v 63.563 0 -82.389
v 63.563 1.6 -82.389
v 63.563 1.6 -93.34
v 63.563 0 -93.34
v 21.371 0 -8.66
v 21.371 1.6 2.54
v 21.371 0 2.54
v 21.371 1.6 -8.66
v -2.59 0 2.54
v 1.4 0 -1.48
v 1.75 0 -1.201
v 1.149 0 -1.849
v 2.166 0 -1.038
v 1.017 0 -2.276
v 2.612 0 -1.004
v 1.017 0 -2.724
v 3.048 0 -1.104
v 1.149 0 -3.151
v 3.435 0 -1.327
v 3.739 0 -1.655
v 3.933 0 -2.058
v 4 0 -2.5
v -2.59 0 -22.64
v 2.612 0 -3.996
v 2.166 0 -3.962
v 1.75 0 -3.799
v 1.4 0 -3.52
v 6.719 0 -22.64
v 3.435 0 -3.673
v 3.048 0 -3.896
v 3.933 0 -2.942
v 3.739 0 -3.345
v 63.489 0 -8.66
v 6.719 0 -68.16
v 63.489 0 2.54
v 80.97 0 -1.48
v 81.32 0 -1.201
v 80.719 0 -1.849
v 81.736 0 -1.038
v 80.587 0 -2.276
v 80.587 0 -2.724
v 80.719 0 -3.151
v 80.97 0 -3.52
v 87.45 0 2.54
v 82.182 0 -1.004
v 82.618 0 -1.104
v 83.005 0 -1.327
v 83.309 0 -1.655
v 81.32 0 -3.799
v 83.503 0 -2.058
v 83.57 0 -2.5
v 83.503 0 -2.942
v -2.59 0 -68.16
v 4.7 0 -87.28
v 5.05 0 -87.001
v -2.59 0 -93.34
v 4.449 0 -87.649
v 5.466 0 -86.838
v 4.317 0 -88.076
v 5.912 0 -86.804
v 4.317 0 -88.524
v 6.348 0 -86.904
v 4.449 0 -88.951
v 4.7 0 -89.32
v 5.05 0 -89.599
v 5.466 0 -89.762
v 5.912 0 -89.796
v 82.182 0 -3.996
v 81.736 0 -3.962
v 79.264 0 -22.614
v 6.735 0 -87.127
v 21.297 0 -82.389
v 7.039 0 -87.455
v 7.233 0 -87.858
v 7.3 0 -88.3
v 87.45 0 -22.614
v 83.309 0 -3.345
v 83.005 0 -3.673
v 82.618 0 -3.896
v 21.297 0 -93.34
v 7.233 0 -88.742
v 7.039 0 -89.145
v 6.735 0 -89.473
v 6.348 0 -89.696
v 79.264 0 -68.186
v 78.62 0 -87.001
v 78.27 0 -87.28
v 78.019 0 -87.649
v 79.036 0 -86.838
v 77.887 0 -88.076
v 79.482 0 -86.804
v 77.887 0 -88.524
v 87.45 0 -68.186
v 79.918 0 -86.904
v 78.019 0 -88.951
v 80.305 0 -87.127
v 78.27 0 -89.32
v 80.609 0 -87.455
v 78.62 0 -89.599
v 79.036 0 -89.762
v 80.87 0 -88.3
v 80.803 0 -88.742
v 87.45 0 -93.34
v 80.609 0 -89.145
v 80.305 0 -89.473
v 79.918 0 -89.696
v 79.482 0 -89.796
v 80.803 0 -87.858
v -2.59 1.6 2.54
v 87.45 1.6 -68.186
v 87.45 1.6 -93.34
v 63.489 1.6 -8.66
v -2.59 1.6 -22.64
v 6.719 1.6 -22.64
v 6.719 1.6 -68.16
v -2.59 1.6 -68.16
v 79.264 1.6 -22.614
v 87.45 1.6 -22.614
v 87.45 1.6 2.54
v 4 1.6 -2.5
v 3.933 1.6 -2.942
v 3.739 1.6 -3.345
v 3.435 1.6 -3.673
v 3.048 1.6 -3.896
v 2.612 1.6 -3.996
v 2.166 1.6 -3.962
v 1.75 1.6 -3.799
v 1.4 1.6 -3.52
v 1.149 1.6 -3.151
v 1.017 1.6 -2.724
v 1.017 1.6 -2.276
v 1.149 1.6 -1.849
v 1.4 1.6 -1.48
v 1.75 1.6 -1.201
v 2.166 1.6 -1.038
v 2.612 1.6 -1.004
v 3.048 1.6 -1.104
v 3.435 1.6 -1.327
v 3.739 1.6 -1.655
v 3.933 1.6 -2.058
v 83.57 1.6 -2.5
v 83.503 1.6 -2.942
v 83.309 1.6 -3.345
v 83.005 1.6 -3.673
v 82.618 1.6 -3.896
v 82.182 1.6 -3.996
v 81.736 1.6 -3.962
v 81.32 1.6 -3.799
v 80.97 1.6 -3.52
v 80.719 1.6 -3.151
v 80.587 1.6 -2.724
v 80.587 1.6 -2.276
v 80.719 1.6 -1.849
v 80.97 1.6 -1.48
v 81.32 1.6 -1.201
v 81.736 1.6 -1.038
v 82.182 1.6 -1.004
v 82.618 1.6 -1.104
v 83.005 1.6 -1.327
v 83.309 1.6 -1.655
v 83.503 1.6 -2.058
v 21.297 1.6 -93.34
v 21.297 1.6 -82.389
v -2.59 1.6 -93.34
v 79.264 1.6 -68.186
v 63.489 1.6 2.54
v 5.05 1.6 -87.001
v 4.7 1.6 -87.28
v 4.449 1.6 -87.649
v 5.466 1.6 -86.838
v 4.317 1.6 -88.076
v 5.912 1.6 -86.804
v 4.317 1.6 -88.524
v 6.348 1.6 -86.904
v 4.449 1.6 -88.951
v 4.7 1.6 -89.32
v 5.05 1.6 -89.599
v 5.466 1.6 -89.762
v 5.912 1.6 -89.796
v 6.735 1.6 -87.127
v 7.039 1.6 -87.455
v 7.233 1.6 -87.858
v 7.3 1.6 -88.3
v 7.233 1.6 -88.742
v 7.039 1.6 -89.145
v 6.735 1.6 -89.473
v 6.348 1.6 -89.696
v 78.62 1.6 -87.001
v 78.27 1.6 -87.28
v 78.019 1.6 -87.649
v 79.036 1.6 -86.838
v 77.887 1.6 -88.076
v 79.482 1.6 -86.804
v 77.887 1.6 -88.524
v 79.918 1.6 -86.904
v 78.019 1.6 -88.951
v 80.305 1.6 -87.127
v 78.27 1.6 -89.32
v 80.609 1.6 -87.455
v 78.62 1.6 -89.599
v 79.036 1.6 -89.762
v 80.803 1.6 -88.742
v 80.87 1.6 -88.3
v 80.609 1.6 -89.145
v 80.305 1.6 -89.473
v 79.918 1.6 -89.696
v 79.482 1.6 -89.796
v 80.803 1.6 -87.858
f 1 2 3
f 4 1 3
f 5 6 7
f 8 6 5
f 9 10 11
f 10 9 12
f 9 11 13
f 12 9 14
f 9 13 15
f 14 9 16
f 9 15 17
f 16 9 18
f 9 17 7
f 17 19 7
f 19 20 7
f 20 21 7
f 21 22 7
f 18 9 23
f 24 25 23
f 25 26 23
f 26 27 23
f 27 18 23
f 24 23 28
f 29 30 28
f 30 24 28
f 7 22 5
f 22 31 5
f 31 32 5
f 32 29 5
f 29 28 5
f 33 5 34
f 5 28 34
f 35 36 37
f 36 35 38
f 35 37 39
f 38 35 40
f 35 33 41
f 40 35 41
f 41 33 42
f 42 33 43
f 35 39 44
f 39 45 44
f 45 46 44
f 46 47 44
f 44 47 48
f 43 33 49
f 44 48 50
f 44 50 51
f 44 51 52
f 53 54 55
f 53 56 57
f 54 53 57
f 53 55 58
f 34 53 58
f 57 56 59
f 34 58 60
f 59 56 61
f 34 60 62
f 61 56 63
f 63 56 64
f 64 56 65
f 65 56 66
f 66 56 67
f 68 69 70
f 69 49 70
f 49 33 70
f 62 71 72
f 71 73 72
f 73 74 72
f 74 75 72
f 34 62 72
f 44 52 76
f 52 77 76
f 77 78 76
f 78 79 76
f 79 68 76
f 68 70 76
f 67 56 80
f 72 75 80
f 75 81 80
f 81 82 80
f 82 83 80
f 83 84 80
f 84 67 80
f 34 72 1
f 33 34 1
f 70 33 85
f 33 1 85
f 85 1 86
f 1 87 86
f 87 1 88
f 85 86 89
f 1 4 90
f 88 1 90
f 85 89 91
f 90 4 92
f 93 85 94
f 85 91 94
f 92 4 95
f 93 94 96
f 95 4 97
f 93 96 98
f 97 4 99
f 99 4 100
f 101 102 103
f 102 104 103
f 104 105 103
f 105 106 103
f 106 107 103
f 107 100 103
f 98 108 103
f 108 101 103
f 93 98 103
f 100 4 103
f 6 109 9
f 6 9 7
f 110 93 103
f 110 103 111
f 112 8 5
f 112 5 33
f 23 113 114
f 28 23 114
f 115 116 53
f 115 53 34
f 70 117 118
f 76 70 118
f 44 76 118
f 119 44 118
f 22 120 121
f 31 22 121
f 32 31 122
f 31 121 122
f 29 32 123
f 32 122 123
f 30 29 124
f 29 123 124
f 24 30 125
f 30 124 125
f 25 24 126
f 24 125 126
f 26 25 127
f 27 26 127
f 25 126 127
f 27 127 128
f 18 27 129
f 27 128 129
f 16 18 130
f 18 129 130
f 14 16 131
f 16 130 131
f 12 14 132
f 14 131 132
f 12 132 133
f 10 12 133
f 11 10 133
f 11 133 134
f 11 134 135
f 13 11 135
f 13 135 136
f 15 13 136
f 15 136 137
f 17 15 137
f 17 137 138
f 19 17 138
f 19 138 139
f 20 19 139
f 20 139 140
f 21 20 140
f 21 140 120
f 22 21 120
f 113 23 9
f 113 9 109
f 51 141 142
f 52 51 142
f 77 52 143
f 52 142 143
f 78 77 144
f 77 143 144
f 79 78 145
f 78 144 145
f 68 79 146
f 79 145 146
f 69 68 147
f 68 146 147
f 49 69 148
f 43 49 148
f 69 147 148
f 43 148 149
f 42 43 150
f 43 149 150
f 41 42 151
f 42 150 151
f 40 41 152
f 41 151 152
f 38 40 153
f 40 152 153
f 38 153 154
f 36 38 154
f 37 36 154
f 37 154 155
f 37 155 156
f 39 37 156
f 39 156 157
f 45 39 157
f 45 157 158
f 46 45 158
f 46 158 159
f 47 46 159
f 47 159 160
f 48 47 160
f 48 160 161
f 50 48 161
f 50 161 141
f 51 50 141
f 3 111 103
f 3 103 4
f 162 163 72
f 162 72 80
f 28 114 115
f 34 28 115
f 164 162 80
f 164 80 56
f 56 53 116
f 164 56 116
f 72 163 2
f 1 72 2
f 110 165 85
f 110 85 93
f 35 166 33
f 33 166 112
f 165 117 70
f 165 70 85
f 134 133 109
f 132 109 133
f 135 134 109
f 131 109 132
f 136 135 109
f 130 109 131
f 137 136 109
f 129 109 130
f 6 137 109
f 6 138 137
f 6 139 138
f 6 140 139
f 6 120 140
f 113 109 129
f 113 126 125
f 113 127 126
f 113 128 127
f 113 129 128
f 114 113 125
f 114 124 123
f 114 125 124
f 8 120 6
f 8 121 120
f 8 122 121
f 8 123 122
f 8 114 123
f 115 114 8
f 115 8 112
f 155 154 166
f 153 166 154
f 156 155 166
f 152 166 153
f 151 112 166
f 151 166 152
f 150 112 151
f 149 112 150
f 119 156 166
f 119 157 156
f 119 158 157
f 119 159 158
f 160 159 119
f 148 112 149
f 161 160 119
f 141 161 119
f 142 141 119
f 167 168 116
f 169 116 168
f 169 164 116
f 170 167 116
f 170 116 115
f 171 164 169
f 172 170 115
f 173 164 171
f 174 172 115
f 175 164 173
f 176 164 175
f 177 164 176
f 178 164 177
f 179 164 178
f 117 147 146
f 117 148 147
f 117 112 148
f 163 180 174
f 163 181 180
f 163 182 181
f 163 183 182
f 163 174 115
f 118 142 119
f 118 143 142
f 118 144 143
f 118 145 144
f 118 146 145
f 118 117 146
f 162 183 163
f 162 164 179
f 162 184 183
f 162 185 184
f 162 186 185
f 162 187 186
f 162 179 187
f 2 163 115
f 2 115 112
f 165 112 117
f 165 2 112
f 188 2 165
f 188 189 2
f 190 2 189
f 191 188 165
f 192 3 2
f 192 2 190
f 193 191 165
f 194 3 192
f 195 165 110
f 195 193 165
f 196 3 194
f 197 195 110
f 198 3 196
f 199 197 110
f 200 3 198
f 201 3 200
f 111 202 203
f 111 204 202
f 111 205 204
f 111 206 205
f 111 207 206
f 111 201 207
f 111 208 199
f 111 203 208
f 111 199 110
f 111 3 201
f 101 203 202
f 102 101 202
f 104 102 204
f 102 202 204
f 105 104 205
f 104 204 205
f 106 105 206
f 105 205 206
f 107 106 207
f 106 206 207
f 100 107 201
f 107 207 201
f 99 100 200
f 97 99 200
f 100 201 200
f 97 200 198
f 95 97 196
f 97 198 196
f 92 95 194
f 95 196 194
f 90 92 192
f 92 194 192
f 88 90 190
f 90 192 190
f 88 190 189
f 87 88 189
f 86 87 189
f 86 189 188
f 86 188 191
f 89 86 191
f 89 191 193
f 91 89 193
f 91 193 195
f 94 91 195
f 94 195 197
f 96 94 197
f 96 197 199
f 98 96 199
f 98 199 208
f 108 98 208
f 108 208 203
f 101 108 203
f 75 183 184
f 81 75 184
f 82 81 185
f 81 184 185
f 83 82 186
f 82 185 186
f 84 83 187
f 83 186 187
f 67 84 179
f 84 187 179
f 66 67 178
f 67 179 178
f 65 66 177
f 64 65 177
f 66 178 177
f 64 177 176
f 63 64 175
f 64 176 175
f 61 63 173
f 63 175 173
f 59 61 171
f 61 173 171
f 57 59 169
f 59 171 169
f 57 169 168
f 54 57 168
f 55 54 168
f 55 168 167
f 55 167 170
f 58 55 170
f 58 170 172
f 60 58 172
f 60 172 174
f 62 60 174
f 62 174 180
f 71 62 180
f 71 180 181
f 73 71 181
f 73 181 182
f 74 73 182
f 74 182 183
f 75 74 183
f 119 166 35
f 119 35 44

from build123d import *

# Parameters (mm, degrees)
SKETCH2_W           = 84.57
SKETCH2_H           = 90.8
BOSS_EXTRUDE1_DEPTH = 1.6
SKETCH3_R           = 1.5
CUT_EXTRUDE1_DEPTH  = 2.6
SKETCH4_W           = 90.8
SKETCH4_H           = 1.6
BOSS_EXTRUDE2_DEPTH = 2.88
SKETCH5_W           = 90.8
SKETCH5_H           = 1.6
BOSS_EXTRUDE3_DEPTH = 2.59
SKETCH6_W           = 90.04
SKETCH6_H           = 1.6
BOSS_EXTRUDE4_DEPTH = 2.54
SKETCH7_W           = 90.04
SKETCH7_H           = 1.6
BOSS_EXTRUDE5_DEPTH = 2.54
SKETCH8_W           = 16.372642976
SKETCH8_H           = 45.571517242
SKETCH8_W_2         = 42.266473234
SKETCH8_H_2         = 21.901065616
SKETCH8_W_3         = 18.617013656
SKETCH8_H_3         = 45.520108402
SKETCH8_W_4         = 42.118702304
SKETCH8_H_4         = 22.400138828
CUT_EXTRUDE2_DEPTH  = 2.6


with BuildPart() as part:
    # Sketch2 → Boss-Extrude1 (new body)
    with BuildSketch(Plane(origin=(0, 0, 0), x_dir=(1, 0, 0), z_dir=(0, 1, 0))):
        with Locations((42.285, 45.4)):
            Rectangle(SKETCH2_W, SKETCH2_H)
    extrude(amount=BOSS_EXTRUDE1_DEPTH)

    # Sketch3 → Cut-Extrude1 (cut, through all)
    with BuildSketch(Plane(origin=(0, 1.6, 0), x_dir=(1, 0, 0), z_dir=(0, 1, 0))):
        with Locations((2.5, 2.5)):
            Circle(SKETCH3_R)
        with Locations((82.07, 2.5)):
            Circle(SKETCH3_R)
        with Locations((5.8, 88.3)):
            Circle(SKETCH3_R)
        with Locations((79.37, 88.3)):
            Circle(SKETCH3_R)
    extrude(amount=-CUT_EXTRUDE1_DEPTH, mode=Mode.SUBTRACT)

    # Sketch4 → Boss-Extrude2 (add)
    with BuildSketch(Plane(origin=(84.57, 0, 0), x_dir=(0, 0, -1), z_dir=(1, 0, 0))):
        with Locations((45.4, 0.8)):
            Rectangle(SKETCH4_W, SKETCH4_H)
    extrude(amount=BOSS_EXTRUDE2_DEPTH)

    # Sketch5 → Boss-Extrude3 (add)
    with BuildSketch(Plane.ZY):
        with Locations((-45.4, 0.8)):
            Rectangle(SKETCH5_W, SKETCH5_H)
    extrude(amount=BOSS_EXTRUDE3_DEPTH)

    # Sketch6 → Boss-Extrude4 (add)
    with BuildSketch(Plane(origin=(0, 0, -90.8), x_dir=(-1, 0, 0), z_dir=(0, 0, -1))):
        with Locations((-42.43, 0.8)):
            Rectangle(SKETCH6_W, SKETCH6_H)
    extrude(amount=BOSS_EXTRUDE4_DEPTH)

    # Sketch7 → Boss-Extrude5 (add)
    with BuildSketch(Plane.XY):
        with Locations((42.43, 0.8)):
            Rectangle(SKETCH7_W, SKETCH7_H)
    extrude(amount=BOSS_EXTRUDE5_DEPTH)

    # Sketch8 → Cut-Extrude2 (cut, through all)
    with BuildSketch(Plane(origin=(0, 1.6, 0), x_dir=(1, 0, 0), z_dir=(0, 1, 0))):
        with Locations((87.45, 45.4)):
            Rectangle(SKETCH8_W, SKETCH8_H)
        with Locations((42.43, 93.34)):
            Rectangle(SKETCH8_W_2, SKETCH8_H_2)
        with Locations((-2.59, 45.4)):
            Rectangle(SKETCH8_W_3, SKETCH8_H_3)
        with Locations((42.43, -2.54)):
            Rectangle(SKETCH8_W_4, SKETCH8_H_4)
    extrude(amount=-CUT_EXTRUDE2_DEPTH, mode=Mode.SUBTRACT)


solid = part.part
